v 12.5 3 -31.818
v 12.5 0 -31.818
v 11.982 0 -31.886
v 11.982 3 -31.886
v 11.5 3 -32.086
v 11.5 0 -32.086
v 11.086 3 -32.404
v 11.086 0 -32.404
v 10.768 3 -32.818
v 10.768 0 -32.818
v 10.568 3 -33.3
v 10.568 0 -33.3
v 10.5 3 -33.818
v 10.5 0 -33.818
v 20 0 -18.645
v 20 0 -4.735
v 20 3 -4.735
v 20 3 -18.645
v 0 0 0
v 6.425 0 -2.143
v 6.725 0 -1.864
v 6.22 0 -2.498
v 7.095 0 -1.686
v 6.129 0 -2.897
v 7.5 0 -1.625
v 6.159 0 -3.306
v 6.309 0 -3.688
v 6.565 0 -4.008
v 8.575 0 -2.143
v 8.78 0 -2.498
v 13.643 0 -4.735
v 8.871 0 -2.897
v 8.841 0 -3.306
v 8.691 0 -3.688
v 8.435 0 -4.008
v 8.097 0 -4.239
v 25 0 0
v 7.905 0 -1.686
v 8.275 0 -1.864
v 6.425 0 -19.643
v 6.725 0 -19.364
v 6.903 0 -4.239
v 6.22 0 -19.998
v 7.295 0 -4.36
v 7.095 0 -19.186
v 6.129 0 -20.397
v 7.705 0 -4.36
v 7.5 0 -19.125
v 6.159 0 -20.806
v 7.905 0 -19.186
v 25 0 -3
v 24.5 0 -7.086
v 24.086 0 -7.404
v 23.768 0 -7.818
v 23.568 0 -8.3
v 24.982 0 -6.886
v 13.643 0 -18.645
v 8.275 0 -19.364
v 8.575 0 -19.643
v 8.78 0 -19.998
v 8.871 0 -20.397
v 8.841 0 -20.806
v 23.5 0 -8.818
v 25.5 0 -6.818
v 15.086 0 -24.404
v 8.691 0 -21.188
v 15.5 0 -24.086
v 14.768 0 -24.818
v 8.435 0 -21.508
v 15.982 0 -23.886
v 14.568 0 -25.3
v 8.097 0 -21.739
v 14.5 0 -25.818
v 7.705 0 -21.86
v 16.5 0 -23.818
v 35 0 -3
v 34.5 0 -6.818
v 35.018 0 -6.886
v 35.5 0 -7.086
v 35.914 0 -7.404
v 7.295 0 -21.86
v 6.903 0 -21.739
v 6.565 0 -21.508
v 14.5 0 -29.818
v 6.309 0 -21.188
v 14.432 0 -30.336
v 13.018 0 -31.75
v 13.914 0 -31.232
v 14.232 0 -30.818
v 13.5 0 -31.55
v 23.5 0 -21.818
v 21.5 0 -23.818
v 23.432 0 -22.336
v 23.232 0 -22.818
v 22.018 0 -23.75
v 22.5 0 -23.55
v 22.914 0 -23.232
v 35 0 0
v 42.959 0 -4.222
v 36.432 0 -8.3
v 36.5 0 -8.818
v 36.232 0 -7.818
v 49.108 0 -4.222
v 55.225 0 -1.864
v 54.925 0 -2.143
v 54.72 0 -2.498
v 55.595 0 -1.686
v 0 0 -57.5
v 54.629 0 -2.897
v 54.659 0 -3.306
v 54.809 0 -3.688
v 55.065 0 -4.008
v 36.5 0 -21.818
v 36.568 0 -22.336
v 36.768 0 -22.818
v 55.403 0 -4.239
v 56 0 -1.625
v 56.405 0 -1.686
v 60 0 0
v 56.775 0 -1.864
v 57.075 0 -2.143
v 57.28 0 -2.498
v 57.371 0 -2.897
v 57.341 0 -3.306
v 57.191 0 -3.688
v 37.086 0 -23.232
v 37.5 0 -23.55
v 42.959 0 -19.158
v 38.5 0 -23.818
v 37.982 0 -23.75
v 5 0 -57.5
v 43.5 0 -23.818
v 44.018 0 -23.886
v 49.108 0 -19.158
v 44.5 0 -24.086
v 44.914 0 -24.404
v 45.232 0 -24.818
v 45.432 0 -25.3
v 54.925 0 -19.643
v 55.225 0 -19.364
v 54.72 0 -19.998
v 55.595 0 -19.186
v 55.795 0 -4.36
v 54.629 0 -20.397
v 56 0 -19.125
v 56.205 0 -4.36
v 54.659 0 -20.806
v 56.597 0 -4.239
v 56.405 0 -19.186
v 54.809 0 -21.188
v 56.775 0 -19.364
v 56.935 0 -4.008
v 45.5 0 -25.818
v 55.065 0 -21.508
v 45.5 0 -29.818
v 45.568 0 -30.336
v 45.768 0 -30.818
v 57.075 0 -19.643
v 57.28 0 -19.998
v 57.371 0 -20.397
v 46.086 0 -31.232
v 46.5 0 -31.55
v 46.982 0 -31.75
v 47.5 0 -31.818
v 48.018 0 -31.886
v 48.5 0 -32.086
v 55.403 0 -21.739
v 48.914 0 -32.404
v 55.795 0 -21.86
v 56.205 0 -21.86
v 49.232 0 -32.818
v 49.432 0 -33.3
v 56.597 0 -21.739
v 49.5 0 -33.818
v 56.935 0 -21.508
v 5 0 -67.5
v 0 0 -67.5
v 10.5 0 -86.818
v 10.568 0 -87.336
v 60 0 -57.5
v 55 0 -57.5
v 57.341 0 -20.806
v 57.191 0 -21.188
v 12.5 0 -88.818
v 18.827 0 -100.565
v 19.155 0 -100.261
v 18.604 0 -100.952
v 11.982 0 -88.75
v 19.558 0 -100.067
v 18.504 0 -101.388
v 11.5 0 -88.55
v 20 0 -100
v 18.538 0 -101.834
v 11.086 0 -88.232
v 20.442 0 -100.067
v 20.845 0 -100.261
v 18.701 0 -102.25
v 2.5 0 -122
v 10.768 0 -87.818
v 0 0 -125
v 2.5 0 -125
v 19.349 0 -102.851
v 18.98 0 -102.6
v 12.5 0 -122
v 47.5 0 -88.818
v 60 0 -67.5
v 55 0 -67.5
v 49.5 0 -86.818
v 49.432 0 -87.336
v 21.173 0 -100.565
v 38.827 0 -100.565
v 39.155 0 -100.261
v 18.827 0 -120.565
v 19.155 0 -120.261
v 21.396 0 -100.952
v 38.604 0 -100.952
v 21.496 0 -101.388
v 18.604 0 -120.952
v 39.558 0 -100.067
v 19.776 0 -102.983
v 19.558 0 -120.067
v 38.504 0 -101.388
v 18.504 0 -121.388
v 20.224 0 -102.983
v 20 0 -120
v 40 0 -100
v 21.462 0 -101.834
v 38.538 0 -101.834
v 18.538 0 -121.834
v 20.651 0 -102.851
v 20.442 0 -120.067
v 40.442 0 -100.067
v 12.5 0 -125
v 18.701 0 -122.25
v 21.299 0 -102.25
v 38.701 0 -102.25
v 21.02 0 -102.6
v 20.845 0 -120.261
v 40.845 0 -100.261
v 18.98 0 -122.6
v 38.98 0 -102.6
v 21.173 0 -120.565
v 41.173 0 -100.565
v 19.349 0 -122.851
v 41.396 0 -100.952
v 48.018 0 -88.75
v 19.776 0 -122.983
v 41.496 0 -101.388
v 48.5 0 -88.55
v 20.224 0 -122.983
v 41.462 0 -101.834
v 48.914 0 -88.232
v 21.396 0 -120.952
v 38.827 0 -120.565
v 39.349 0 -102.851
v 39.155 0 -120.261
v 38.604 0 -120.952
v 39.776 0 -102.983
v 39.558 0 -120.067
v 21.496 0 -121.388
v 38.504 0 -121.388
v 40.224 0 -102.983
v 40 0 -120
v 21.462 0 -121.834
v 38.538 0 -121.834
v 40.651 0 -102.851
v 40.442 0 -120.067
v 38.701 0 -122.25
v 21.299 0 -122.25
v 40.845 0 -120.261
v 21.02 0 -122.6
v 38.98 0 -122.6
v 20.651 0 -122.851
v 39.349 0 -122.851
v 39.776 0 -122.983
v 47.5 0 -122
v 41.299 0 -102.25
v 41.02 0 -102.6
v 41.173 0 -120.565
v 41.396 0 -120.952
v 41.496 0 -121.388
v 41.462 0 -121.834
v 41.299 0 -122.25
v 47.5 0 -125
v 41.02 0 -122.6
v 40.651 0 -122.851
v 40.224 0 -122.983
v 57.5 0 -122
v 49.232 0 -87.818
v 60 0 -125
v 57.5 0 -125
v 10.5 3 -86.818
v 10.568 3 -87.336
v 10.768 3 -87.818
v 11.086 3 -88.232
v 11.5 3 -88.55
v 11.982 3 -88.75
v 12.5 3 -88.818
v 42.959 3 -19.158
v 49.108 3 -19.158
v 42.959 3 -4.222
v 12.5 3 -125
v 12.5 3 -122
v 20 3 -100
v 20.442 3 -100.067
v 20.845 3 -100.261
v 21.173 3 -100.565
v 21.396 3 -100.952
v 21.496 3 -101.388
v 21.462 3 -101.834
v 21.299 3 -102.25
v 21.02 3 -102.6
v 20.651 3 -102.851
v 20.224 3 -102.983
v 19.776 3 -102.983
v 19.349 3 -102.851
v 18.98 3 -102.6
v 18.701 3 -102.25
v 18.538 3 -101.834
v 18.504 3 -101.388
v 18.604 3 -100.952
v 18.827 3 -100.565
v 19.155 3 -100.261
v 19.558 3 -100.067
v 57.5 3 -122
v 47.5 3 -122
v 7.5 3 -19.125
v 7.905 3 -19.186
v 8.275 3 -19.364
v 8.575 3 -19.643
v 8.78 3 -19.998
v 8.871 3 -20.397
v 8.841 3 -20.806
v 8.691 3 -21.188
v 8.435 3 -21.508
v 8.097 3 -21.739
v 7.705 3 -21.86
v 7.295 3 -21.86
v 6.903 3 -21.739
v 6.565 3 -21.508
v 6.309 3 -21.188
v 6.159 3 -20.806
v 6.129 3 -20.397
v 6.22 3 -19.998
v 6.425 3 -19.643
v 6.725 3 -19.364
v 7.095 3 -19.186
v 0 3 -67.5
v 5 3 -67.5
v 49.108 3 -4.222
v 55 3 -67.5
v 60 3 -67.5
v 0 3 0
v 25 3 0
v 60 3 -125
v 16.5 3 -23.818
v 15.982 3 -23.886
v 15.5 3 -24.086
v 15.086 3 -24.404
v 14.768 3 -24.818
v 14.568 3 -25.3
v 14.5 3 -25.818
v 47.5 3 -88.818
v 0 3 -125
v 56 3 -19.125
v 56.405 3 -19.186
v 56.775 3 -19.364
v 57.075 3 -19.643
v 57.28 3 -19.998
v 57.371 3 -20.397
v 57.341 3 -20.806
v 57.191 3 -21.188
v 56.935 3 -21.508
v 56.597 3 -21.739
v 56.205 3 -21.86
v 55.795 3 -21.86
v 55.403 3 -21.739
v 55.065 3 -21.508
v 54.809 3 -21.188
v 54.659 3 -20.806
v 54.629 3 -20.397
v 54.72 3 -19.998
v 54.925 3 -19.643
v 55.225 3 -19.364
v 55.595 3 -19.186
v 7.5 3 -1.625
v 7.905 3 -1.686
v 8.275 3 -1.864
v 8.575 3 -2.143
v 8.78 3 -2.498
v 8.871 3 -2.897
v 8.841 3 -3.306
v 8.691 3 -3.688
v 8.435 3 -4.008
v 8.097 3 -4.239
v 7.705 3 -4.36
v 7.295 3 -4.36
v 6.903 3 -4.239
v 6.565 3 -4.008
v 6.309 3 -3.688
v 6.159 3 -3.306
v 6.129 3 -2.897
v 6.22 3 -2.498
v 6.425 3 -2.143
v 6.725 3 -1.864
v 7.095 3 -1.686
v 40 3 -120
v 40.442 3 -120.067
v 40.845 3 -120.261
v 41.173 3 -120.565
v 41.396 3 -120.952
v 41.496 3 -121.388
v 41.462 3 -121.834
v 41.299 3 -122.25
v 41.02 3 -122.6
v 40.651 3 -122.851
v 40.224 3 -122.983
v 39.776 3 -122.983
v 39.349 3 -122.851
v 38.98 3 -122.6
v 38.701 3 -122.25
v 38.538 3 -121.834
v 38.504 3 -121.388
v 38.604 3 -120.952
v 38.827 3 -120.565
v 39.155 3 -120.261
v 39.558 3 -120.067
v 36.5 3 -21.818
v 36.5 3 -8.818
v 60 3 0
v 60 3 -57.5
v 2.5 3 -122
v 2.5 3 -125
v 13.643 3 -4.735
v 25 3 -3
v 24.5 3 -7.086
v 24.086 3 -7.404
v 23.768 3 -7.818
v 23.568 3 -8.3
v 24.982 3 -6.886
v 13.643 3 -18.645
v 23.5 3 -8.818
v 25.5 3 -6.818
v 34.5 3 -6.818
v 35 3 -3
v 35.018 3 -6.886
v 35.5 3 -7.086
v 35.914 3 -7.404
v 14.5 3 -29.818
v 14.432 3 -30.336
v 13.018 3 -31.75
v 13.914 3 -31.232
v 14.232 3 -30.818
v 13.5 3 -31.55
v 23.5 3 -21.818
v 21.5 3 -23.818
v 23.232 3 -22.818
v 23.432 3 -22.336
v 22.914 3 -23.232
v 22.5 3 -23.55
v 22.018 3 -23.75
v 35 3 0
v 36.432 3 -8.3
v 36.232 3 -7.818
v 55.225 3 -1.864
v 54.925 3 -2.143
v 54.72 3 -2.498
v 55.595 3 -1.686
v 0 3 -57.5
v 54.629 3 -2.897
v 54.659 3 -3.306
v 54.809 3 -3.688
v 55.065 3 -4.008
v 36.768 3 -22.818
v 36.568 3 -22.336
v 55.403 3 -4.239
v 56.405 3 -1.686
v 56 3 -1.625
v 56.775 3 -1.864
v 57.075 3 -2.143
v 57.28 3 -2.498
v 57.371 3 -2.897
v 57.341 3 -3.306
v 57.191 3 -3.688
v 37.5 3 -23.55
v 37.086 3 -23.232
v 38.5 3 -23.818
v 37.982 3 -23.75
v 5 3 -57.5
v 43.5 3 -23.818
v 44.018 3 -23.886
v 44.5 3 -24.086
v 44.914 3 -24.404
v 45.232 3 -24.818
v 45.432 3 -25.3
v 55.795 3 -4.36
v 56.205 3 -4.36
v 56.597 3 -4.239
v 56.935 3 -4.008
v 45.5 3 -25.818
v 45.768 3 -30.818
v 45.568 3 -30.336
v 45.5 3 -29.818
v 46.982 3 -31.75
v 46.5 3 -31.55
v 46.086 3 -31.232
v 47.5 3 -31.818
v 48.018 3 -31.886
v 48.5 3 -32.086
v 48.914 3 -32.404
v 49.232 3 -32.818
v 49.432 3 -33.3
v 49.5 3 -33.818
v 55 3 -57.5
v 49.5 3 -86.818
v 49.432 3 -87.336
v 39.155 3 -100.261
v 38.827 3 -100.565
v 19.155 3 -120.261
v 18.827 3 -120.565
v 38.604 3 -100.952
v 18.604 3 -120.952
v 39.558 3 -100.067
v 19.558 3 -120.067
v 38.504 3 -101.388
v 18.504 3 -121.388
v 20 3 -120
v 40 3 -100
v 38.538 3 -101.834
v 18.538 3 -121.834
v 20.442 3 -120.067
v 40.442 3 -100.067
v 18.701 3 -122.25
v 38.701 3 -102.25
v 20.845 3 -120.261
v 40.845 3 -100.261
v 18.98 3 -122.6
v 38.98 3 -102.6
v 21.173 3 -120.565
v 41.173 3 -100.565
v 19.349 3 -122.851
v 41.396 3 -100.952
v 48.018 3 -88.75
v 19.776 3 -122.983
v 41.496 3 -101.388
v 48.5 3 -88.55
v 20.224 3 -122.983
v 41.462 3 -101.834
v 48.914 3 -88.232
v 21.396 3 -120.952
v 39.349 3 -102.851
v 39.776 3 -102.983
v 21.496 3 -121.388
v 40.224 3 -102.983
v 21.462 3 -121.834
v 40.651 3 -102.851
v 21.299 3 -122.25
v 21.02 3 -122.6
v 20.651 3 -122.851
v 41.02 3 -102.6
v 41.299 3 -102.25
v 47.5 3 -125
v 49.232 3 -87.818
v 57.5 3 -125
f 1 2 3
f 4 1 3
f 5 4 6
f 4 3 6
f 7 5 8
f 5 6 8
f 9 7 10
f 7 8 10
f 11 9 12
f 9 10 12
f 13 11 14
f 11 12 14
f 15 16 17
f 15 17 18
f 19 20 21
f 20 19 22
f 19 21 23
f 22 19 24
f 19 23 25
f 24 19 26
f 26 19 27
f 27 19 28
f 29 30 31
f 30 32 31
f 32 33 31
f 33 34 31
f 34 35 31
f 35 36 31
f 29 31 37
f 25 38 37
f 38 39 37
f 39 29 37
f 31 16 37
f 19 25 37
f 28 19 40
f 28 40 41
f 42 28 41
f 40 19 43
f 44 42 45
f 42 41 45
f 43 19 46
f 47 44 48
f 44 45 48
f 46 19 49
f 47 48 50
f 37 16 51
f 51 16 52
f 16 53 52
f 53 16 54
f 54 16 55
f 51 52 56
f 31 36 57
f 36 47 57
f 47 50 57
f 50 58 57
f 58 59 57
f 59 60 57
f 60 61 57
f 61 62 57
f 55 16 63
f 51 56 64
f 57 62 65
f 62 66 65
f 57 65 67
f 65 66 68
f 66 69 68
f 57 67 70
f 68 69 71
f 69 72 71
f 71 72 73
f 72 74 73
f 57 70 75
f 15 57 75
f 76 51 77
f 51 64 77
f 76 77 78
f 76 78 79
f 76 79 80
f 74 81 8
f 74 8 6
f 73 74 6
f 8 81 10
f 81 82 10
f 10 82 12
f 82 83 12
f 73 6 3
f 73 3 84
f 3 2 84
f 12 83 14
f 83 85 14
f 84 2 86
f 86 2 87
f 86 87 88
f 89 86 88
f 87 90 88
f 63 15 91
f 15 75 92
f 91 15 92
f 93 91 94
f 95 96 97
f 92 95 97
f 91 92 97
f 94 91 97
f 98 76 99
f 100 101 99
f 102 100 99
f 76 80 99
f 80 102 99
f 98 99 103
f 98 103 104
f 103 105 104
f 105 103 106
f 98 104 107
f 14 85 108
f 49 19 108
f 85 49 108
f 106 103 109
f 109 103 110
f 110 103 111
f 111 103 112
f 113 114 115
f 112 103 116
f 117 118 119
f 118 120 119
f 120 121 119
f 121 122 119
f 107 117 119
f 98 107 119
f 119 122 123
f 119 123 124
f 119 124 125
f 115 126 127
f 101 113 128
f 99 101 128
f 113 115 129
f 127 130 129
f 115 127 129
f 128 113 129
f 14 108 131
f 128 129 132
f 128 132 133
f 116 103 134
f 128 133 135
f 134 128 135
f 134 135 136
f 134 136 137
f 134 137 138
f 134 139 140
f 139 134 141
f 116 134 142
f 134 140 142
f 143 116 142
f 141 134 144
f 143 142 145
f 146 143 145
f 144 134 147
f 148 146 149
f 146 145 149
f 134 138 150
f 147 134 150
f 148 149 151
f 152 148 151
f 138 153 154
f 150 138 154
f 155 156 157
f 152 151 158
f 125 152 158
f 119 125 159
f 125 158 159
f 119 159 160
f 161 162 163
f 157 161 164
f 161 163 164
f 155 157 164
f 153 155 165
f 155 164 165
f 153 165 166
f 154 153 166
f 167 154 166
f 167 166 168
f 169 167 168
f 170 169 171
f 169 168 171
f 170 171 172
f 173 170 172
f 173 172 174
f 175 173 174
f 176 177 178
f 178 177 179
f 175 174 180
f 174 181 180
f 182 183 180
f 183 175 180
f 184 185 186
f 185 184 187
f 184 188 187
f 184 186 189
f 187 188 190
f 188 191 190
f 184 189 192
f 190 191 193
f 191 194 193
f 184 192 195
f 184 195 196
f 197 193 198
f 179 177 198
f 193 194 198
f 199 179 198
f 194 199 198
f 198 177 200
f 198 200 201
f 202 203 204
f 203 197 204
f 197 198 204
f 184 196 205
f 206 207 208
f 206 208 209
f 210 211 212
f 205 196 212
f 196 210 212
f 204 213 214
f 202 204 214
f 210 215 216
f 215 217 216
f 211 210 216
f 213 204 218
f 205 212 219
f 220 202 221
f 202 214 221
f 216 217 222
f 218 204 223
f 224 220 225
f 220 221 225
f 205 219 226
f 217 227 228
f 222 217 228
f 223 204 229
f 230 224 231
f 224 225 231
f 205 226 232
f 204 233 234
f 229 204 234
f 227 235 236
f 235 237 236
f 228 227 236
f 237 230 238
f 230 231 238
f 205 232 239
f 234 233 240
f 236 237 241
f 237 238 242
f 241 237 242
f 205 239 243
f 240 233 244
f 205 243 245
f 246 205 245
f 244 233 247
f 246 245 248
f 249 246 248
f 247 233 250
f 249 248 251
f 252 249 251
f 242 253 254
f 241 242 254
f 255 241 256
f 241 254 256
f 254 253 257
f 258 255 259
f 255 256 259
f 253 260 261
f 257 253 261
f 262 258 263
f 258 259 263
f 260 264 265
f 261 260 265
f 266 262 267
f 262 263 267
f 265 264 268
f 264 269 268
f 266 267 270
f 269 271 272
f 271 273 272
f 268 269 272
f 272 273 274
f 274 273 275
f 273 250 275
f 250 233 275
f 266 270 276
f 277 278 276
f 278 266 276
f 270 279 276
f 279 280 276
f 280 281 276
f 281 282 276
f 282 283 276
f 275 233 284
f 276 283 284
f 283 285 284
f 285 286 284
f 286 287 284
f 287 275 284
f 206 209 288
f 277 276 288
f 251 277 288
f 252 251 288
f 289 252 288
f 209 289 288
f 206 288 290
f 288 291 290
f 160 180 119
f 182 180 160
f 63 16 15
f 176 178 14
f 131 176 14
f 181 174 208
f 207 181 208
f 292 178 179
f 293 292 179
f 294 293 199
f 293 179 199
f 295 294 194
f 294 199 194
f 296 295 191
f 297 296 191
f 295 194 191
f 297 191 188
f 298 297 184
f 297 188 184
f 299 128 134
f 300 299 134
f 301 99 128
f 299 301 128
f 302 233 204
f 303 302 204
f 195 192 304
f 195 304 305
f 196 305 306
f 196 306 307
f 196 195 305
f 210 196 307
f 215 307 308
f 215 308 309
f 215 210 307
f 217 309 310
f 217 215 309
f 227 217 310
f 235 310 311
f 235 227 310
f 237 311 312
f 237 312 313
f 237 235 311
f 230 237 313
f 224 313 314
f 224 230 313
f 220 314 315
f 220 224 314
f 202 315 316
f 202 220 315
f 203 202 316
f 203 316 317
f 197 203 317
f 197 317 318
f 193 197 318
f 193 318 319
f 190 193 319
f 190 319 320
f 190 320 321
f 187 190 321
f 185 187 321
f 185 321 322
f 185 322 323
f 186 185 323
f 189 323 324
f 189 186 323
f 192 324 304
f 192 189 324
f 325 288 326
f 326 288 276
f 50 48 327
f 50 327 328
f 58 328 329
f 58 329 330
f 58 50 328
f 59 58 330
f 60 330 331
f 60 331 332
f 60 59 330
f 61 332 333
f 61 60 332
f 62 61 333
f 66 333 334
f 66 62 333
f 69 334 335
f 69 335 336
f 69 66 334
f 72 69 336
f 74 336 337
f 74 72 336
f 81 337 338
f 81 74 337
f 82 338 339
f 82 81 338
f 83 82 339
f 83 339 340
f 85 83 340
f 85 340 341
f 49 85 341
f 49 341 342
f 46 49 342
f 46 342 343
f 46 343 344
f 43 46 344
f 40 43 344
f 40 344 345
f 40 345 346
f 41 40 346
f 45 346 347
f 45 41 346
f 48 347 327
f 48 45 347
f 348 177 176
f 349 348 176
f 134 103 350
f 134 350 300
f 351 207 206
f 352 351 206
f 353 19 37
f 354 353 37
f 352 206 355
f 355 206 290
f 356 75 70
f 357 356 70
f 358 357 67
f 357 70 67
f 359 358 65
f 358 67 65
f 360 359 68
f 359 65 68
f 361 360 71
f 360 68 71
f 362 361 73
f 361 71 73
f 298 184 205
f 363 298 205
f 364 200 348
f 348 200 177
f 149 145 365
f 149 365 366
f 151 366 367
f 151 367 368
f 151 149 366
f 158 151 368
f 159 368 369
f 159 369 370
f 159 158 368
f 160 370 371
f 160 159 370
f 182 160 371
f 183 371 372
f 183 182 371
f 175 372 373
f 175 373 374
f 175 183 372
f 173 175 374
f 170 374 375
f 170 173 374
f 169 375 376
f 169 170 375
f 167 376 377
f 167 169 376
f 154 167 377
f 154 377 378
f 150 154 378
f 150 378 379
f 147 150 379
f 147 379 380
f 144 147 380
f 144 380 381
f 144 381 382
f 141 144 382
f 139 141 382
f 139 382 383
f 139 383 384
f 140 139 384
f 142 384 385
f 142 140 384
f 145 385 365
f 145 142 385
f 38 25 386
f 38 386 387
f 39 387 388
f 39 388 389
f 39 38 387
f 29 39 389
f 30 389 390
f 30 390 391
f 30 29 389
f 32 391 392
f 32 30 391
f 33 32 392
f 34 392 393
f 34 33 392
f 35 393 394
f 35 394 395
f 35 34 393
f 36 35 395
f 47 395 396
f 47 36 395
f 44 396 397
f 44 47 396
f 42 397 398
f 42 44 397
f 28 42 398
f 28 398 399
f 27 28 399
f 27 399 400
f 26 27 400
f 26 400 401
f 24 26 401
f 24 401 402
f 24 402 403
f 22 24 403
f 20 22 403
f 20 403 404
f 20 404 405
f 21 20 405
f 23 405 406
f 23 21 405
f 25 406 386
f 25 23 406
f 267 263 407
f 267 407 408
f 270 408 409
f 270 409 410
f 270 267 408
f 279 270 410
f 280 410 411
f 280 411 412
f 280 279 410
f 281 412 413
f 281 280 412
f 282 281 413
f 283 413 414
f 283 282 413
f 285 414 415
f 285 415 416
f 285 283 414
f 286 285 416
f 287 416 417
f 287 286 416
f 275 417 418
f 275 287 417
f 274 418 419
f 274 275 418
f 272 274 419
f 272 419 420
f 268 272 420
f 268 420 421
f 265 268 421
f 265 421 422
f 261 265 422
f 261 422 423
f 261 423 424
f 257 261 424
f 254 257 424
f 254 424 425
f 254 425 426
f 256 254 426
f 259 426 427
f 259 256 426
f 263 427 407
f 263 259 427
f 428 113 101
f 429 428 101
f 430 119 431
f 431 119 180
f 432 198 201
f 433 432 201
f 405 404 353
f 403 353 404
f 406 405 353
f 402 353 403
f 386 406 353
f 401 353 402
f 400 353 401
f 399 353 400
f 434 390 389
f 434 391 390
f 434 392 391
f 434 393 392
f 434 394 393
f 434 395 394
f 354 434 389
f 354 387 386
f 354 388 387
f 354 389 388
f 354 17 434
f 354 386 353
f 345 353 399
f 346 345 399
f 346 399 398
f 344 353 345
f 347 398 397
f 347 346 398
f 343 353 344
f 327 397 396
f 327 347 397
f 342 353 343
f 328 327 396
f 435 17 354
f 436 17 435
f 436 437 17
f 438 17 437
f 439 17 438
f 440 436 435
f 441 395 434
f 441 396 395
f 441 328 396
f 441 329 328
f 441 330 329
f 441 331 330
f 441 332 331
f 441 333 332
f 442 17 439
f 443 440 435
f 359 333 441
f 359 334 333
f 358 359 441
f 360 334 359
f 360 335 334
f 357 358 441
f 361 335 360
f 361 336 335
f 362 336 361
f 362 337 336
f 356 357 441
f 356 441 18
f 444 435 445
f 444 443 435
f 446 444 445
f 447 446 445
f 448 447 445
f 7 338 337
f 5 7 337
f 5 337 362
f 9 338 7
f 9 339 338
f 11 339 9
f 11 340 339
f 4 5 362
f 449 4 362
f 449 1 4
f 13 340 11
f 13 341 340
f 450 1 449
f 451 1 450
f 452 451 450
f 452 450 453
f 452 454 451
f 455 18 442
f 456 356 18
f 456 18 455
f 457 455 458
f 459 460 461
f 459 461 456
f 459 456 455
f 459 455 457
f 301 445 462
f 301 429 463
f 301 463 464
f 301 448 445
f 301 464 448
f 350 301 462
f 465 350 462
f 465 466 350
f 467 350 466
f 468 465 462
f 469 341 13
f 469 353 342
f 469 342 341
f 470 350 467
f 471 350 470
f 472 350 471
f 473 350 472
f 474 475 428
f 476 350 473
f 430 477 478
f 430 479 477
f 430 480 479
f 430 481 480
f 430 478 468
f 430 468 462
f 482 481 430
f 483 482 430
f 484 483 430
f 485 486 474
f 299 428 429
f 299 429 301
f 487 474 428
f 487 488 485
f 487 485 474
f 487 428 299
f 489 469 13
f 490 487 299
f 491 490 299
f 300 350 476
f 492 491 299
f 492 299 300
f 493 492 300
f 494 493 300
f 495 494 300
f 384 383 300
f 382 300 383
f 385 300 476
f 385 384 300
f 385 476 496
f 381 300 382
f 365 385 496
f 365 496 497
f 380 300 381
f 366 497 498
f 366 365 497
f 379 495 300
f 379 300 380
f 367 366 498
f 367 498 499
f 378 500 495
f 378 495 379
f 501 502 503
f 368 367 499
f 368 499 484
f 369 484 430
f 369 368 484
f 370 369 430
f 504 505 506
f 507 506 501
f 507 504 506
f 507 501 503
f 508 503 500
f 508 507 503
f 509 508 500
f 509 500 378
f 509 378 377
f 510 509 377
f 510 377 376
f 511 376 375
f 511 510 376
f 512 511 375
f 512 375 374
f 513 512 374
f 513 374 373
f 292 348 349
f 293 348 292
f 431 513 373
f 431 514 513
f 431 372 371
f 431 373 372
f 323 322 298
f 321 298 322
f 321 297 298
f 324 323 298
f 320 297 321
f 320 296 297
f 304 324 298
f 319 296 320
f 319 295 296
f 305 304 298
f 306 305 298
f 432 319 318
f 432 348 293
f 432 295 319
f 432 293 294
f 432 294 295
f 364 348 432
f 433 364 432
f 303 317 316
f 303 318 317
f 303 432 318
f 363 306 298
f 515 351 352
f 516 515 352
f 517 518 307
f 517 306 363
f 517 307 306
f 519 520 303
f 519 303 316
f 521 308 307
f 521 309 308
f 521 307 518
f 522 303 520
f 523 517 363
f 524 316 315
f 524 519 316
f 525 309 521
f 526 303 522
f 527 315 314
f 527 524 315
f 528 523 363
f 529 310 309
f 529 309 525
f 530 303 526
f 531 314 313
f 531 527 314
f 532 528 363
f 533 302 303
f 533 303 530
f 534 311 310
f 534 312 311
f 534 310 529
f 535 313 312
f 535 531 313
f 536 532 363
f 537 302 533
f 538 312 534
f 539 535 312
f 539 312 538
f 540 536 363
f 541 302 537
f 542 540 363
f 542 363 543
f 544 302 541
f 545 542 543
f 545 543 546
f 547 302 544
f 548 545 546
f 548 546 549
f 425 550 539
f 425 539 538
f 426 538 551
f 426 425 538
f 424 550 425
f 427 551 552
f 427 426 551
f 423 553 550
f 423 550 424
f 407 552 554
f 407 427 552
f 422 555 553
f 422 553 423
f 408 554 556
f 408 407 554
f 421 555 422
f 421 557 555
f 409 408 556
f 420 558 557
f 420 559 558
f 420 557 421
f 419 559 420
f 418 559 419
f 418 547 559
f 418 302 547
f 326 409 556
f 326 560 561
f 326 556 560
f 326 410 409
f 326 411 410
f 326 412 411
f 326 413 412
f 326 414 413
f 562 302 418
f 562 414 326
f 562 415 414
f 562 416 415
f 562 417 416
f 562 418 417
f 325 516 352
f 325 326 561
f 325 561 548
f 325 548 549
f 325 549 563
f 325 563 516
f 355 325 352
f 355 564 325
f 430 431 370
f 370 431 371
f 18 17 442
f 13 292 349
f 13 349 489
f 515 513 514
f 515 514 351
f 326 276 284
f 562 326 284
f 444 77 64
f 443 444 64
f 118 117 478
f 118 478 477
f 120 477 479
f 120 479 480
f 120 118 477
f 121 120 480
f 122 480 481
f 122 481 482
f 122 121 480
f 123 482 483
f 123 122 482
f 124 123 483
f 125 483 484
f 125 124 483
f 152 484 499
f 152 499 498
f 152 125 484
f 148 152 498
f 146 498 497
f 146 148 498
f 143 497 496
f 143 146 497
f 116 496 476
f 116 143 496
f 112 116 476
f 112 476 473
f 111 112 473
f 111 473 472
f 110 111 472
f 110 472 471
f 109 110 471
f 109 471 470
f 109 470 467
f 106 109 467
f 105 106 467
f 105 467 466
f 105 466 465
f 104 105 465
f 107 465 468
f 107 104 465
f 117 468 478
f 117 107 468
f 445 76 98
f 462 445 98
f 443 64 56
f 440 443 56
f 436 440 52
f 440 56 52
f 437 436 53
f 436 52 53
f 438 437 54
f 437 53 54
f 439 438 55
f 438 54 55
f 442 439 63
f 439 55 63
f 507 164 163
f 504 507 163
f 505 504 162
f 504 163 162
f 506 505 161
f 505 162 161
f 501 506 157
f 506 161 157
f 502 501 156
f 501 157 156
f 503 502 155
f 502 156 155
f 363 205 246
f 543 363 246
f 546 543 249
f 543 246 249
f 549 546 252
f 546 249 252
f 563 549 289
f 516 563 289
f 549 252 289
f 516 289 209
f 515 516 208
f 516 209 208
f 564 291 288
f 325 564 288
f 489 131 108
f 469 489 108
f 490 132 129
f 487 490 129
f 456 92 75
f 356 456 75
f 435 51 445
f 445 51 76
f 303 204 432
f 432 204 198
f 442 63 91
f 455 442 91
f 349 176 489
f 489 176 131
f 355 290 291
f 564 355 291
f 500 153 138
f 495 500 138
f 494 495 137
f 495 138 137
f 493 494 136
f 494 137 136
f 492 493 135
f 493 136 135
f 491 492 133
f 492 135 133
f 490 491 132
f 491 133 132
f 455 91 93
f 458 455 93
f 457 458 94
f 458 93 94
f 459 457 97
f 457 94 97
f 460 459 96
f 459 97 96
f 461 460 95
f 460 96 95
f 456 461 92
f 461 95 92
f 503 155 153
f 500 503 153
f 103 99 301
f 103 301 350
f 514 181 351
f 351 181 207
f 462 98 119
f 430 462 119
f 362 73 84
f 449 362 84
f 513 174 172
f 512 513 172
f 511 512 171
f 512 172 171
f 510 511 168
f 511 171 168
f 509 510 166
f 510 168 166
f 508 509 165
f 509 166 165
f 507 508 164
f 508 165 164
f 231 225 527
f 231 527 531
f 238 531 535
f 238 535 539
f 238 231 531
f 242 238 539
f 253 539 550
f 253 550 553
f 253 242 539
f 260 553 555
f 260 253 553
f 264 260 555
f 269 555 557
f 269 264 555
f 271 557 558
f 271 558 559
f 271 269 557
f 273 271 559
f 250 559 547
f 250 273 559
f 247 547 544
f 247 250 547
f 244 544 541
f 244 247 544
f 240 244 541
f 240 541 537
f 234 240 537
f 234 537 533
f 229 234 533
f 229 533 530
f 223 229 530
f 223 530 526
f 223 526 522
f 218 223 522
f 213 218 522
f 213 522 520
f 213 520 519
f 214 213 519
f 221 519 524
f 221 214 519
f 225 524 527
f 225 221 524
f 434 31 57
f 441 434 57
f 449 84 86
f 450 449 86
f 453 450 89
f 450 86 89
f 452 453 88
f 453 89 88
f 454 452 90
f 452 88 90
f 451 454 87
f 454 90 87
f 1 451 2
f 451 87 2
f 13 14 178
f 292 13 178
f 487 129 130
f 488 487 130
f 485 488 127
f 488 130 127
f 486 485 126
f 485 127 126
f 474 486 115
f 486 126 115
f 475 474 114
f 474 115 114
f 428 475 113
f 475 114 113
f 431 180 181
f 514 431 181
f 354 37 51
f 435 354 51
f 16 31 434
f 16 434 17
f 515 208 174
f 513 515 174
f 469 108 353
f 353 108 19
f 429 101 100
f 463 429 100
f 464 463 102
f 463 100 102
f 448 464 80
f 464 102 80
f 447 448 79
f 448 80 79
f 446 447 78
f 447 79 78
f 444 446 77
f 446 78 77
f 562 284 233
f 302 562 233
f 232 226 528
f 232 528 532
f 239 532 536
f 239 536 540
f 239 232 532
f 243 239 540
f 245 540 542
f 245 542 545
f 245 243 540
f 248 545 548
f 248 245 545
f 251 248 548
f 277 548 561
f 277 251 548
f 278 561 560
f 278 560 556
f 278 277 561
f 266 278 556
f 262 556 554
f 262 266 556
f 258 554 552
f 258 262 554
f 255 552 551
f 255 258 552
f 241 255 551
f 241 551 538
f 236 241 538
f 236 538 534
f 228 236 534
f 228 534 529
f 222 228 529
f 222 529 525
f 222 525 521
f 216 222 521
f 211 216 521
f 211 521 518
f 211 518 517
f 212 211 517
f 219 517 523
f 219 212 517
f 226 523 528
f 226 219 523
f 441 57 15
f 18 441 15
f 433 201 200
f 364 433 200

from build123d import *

# Parameters (mm, degrees)
CROQUIS1_R              = 1.5
CROQUIS1_R_2            = 1.375
CROQUIS1_W              = 6.357227068
CROQUIS1_H              = 13.910539406
CROQUIS1_W_2            = 6.149922685
CROQUIS1_H_2            = 14.93552652
SALIENTE_EXTRUIR1_DEPTH = 3


with BuildPart() as part:
    # Croquis1 → Saliente-Extruir1 (new body)
    with BuildSketch(Plane(origin=(0, 0, 0), x_dir=(1, 0, 0), z_dir=(0, 1, 0))):
        Polygon((0, 0), (25, 0), (25, 3), (35, 3), (35, 0), (60, 0), (60, 57.5), (55, 57.5), (55, 67.5), (60, 67.5), (60, 125), (57.5, 125), (57.5, 122), (47.5, 122), (47.5, 125), (12.5, 125), (12.5, 122), (2.5, 122), (2.5, 125), (0, 125), (0, 67.5), (5, 67.5), (5, 57.5), (0, 57.5), align=None)
        with Locations(Location((20, 101.5, 0), (0, 0, 270))):
            Circle(CROQUIS1_R, mode=Mode.SUBTRACT)
        with Locations(Location((20, 121.5, 0), (0, 0, 270))):
            Circle(CROQUIS1_R, mode=Mode.SUBTRACT)
        with Locations(Location((40, 121.5, 0), (0, 0, 270))):
            Circle(CROQUIS1_R, mode=Mode.SUBTRACT)
        with Locations(Location((40, 101.5, 0), (0, 0, 270))):
            Circle(CROQUIS1_R, mode=Mode.SUBTRACT)
        with Locations(Location((7.5, 3, 0), (0, 0, 270))):
            Circle(CROQUIS1_R_2, mode=Mode.SUBTRACT)
        with Locations(Location((7.5, 20.5, 0), (0, 0, 270))):
            Circle(CROQUIS1_R_2, mode=Mode.SUBTRACT)
        with Locations(Location((56, 20.5, 0), (0, 0, 270))):
            Circle(CROQUIS1_R_2, mode=Mode.SUBTRACT)
        with Locations(Location((56, 3, 0), (0, 0, 270))):
            Circle(CROQUIS1_R_2, mode=Mode.SUBTRACT)
        with Locations((16.821386466, 11.689804861)):
            Rectangle(CROQUIS1_W, CROQUIS1_H, mode=Mode.SUBTRACT)
        with Locations((46.033519219, 11.689804861)):
            Rectangle(CROQUIS1_W_2, CROQUIS1_H_2, mode=Mode.SUBTRACT)
        with BuildLine():
            Line((10.5, 33.818022813), (10.5, 86.818022813))
            ThreePointArc((10.5, 86.818022813), (11.085786438, 88.232236376), (12.5, 88.818022813))
            Line((12.5, 88.818022813), (47.5, 88.818022813))
            ThreePointArc((47.5, 88.818022813), (48.914213562, 88.232236376), (49.5, 86.818022813))
            Line((49.5, 86.818022813), (49.5, 33.818022813))
            ThreePointArc((49.5, 33.818022813), (48.914213562, 32.403809251), (47.5, 31.818022813))
            ThreePointArc((47.5, 31.818022813), (46.085786438, 31.232236376), (45.5, 29.818022813))
            Line((45.5, 29.818022813), (45.5, 25.818022813))
            ThreePointArc((45.5, 25.818022813), (44.914213562, 24.403809251), (43.5, 23.818022813))
            Line((43.5, 23.818022813), (38.5, 23.818022813))
            ThreePointArc((38.5, 23.818022813), (37.085786438, 23.232236376), (36.5, 21.818022813))
            Line((36.5, 21.818022813), (36.5, 8.818022813))
            ThreePointArc((36.5, 8.818022813), (35.914213562, 7.403809251), (34.5, 6.818022813))
            Line((34.5, 6.818022813), (25.5, 6.818022813))
            ThreePointArc((25.5, 6.818022813), (24.085786438, 7.403809251), (23.5, 8.818022813))
            Line((23.5, 8.818022813), (23.5, 21.818022813))
            ThreePointArc((23.5, 21.818022813), (22.914213562, 23.232236376), (21.5, 23.818022813))
            Line((21.5, 23.818022813), (16.5, 23.818022813))
            ThreePointArc((16.5, 23.818022813), (15.085786438, 24.403809251), (14.5, 25.818022813))
            Line((14.5, 25.818022813), (14.5, 29.818022813))
            ThreePointArc((14.5, 29.818022813), (13.914213562, 31.232236376), (12.5, 31.818022813))
            ThreePointArc((12.5, 31.818022813), (11.085786438, 32.403809251), (10.5, 33.818022813))
        make_face(mode=Mode.SUBTRACT)
    extrude(amount=SALIENTE_EXTRUIR1_DEPTH)


solid = part.part
